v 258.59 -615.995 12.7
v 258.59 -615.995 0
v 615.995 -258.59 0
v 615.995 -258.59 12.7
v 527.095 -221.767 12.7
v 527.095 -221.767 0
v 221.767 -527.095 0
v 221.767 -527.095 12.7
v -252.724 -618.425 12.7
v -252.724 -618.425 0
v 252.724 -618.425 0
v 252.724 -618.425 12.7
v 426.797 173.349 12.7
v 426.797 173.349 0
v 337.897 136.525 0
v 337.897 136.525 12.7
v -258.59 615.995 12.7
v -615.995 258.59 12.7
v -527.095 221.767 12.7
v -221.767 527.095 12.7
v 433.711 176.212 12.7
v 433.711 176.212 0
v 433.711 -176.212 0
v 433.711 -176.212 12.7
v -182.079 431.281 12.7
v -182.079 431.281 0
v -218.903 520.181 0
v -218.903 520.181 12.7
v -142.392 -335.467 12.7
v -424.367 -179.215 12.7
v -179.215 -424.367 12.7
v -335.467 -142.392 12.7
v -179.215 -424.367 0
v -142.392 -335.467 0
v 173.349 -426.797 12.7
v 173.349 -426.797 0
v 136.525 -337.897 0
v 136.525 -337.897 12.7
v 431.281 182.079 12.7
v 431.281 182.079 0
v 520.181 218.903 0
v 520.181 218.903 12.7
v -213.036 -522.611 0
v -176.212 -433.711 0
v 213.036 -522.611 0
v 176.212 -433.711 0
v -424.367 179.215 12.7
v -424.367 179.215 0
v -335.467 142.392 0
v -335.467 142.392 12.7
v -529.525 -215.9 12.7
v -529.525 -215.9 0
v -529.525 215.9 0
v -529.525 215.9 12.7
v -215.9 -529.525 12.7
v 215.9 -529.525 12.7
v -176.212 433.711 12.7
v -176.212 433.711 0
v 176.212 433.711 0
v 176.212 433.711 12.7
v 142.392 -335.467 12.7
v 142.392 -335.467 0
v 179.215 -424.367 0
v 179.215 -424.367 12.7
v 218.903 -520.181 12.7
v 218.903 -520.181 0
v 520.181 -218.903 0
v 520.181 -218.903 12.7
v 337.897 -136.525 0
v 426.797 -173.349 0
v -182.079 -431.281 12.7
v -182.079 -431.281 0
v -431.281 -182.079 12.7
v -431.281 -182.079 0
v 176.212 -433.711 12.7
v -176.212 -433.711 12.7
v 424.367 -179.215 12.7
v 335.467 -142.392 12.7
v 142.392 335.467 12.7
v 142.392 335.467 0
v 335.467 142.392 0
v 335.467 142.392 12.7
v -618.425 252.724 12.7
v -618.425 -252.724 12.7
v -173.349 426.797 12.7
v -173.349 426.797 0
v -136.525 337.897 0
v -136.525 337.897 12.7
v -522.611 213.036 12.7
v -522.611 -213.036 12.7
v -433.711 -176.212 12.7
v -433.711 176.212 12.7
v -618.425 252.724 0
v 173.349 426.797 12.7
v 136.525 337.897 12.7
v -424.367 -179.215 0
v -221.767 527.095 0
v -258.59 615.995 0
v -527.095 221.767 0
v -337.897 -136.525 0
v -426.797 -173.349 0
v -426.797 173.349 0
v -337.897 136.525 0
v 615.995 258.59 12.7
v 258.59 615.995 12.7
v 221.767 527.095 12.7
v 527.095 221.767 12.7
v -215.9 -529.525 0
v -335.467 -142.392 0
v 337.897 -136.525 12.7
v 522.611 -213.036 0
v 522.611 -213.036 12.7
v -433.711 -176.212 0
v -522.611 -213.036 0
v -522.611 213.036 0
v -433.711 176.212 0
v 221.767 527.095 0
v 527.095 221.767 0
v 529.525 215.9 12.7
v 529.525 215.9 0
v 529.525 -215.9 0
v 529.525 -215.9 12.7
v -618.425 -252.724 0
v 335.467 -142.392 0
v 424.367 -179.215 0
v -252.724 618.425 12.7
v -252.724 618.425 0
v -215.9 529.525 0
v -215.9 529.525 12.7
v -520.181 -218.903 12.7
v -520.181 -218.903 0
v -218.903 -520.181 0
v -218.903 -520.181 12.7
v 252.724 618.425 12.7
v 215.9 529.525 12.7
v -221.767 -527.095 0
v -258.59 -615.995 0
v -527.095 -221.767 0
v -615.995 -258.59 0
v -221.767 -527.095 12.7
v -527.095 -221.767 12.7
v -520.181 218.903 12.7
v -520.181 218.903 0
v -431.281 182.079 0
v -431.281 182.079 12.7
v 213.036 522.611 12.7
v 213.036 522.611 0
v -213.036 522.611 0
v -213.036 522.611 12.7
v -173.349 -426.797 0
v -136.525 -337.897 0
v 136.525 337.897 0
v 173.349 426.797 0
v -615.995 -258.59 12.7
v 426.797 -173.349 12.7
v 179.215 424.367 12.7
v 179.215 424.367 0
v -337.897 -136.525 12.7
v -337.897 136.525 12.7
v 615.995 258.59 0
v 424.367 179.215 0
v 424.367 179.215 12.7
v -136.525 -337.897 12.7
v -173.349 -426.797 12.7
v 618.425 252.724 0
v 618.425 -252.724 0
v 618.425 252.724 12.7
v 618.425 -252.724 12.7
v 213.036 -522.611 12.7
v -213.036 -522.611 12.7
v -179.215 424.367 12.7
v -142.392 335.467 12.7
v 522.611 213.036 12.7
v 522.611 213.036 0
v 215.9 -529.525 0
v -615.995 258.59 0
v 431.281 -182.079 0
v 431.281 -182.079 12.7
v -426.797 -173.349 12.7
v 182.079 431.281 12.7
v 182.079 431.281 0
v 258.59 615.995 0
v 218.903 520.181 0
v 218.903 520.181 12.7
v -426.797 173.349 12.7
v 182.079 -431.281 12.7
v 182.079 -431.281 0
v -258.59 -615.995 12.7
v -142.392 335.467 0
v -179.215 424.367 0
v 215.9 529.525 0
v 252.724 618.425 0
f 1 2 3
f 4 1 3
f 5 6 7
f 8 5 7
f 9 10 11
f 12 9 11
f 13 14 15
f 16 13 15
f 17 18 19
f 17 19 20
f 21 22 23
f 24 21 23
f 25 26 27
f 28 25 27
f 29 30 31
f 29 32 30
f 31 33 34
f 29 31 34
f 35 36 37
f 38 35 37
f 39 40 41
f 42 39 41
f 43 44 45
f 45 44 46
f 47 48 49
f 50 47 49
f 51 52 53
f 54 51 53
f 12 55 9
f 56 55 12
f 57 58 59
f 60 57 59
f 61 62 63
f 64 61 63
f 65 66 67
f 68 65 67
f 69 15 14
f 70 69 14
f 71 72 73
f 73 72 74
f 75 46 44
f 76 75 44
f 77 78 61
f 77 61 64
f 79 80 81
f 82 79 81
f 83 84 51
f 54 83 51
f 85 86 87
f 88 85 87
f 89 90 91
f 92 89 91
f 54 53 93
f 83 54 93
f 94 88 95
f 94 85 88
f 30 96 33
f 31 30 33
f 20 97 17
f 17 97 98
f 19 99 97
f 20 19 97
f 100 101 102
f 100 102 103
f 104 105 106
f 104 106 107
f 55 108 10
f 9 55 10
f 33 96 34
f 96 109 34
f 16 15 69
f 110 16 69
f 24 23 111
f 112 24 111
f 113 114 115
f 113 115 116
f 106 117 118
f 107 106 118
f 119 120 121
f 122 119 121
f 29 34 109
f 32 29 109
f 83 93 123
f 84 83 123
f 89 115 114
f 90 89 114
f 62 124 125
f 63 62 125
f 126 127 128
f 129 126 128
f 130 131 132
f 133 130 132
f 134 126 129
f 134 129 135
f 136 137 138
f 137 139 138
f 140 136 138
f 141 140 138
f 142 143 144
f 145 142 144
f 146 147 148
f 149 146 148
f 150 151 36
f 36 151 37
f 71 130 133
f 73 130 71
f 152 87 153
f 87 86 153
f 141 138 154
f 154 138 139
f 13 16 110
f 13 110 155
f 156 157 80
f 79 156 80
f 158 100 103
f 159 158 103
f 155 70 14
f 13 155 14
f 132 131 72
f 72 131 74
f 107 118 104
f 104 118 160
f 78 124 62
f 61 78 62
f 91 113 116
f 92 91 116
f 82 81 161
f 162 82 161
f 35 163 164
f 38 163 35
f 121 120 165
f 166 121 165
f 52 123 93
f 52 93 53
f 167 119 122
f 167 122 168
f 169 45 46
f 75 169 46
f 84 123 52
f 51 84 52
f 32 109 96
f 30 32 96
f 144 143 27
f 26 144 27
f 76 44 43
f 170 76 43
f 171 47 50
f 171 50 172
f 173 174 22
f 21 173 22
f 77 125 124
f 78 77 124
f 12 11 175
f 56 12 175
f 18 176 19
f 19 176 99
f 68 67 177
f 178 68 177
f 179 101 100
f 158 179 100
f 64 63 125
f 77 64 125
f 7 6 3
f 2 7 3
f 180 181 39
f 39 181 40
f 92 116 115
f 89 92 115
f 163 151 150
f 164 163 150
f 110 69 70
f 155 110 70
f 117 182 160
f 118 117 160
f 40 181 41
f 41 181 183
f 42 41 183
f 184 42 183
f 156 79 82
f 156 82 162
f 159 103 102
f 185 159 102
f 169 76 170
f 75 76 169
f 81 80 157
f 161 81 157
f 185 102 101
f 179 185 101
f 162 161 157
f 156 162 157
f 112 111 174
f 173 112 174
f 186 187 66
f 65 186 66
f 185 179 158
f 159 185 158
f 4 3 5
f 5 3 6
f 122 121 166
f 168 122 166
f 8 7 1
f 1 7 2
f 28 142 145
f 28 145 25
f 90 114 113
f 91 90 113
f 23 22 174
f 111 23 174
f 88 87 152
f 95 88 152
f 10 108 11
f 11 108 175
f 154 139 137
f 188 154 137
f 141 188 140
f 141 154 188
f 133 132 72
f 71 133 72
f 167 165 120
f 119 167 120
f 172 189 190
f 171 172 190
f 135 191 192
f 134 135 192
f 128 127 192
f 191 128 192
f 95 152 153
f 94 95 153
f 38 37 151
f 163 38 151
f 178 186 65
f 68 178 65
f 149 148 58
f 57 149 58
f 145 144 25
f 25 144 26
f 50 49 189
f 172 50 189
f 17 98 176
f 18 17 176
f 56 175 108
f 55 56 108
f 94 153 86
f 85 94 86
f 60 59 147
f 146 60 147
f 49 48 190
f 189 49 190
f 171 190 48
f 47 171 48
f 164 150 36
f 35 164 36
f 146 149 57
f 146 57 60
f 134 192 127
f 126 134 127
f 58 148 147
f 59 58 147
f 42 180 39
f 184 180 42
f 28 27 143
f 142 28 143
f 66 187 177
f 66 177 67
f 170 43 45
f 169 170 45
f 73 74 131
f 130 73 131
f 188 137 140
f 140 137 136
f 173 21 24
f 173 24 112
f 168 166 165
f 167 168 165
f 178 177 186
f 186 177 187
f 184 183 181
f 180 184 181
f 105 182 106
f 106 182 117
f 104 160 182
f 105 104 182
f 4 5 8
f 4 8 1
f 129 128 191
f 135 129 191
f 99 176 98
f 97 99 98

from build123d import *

# Parameters (mm, degrees)
F1_DEPTH = 12.7
F3_DEPTH = 12.7
F5_DEPTH = 12.7


with BuildPart() as f1:
    # F0 (on Top) → F1 (new body)
    with BuildSketch(Plane.XY):
        Polygon((-136.525, 337.897181), (136.525, 337.897181), (173.348586, 426.797181), (-173.348586, 426.797181), align=None)
        Polygon((-179.215221, 424.367142), (-424.367142, 179.215221), (-335.467142, 142.391635), (-142.391635, 335.467142), align=None)
        Polygon((-426.797181, 173.348586), (-426.797181, -173.348586), (-337.897181, -136.525), (-337.897181, 136.525), align=None)
        Polygon((-424.367142, -179.215221), (-179.215221, -424.367142), (-142.391635, -335.467142), (-335.467142, -142.391635), align=None)
        Polygon((-173.348586, -426.797181), (173.348586, -426.797181), (136.525, -337.897181), (-136.525, -337.897181), align=None)
        Polygon((179.215221, -424.367142), (424.367142, -179.215221), (335.467142, -142.391635), (142.391635, -335.467142), align=None)
        Polygon((426.797181, -173.348586), (426.797181, 173.348586), (337.897181, 136.525), (337.897181, -136.525), align=None)
        Polygon((424.367142, 179.215221), (179.215221, 424.367142), (142.391635, 335.467142), (335.467142, 142.391635), align=None)
    extrude(amount=F1_DEPTH)


with BuildPart() as f3:
    # F2 (on Top) → F3 (new body)
    with BuildSketch(Plane.XY):
        Polygon((213.036086, 522.611282), (-213.036086, 522.611282), (-176.2125, 433.711282), (176.2125, 433.711282), align=None)
        Polygon((-520.181242, 218.902721), (-431.281242, 182.079135), (-182.079135, 431.281242), (-218.902721, 520.181242), align=None)
        Polygon((-522.611282, -213.036086), (-433.711282, -176.2125), (-433.711282, 176.2125), (-522.611282, 213.036086), align=None)
        Polygon((-218.902721, -520.181242), (-182.079135, -431.281242), (-431.281242, -182.079135), (-520.181242, -218.902721), align=None)
        Polygon((213.036086, -522.611282), (176.2125, -433.711282), (-176.2125, -433.711282), (-213.036086, -522.611282), align=None)
        Polygon((520.181242, -218.902721), (431.281242, -182.079135), (182.079135, -431.281242), (218.902721, -520.181242), align=None)
        Polygon((522.611282, 213.036086), (433.711282, 176.2125), (433.711282, -176.2125), (522.611282, -213.036086), align=None)
        Polygon((218.902721, 520.181242), (182.079135, 431.281242), (431.281242, 182.079135), (520.181242, 218.902721), align=None)
    extrude(amount=F3_DEPTH)


with BuildPart() as f5:
    # F4 (on Top) → F5 (new body)
    with BuildSketch(Plane.XY):
        Polygon((252.723586, 618.425383), (-252.723586, 618.425383), (-215.9, 529.525383), (215.9, 529.525383), align=None)
        Polygon((-615.995343, 258.590221), (-527.095343, 221.766635), (-221.766635, 527.095343), (-258.590221, 615.995343), align=None)
        Polygon((-618.425383, -252.723586), (-529.525383, -215.9), (-529.525383, 215.9), (-618.425383, 252.723586), align=None)
        Polygon((-258.590221, -615.995343), (-221.766635, -527.095343), (-527.095343, -221.766635), (-615.995343, -258.590221), align=None)
        Polygon((252.723586, -618.425383), (215.9, -529.525383), (-215.9, -529.525383), (-252.723586, -618.425383), align=None)
        Polygon((615.995343, -258.590221), (527.095343, -221.766635), (221.766635, -527.095343), (258.590221, -615.995343), align=None)
        Polygon((618.425383, 252.723586), (529.525383, 215.9), (529.525383, -215.9), (618.425383, -252.723586), align=None)
        Polygon((258.590221, 615.995343), (221.766635, 527.095343), (527.095343, 221.766635), (615.995343, 258.590221), align=None)
    extrude(amount=F5_DEPTH)


solid = Compound([f1.part, f3.part, f5.part])
